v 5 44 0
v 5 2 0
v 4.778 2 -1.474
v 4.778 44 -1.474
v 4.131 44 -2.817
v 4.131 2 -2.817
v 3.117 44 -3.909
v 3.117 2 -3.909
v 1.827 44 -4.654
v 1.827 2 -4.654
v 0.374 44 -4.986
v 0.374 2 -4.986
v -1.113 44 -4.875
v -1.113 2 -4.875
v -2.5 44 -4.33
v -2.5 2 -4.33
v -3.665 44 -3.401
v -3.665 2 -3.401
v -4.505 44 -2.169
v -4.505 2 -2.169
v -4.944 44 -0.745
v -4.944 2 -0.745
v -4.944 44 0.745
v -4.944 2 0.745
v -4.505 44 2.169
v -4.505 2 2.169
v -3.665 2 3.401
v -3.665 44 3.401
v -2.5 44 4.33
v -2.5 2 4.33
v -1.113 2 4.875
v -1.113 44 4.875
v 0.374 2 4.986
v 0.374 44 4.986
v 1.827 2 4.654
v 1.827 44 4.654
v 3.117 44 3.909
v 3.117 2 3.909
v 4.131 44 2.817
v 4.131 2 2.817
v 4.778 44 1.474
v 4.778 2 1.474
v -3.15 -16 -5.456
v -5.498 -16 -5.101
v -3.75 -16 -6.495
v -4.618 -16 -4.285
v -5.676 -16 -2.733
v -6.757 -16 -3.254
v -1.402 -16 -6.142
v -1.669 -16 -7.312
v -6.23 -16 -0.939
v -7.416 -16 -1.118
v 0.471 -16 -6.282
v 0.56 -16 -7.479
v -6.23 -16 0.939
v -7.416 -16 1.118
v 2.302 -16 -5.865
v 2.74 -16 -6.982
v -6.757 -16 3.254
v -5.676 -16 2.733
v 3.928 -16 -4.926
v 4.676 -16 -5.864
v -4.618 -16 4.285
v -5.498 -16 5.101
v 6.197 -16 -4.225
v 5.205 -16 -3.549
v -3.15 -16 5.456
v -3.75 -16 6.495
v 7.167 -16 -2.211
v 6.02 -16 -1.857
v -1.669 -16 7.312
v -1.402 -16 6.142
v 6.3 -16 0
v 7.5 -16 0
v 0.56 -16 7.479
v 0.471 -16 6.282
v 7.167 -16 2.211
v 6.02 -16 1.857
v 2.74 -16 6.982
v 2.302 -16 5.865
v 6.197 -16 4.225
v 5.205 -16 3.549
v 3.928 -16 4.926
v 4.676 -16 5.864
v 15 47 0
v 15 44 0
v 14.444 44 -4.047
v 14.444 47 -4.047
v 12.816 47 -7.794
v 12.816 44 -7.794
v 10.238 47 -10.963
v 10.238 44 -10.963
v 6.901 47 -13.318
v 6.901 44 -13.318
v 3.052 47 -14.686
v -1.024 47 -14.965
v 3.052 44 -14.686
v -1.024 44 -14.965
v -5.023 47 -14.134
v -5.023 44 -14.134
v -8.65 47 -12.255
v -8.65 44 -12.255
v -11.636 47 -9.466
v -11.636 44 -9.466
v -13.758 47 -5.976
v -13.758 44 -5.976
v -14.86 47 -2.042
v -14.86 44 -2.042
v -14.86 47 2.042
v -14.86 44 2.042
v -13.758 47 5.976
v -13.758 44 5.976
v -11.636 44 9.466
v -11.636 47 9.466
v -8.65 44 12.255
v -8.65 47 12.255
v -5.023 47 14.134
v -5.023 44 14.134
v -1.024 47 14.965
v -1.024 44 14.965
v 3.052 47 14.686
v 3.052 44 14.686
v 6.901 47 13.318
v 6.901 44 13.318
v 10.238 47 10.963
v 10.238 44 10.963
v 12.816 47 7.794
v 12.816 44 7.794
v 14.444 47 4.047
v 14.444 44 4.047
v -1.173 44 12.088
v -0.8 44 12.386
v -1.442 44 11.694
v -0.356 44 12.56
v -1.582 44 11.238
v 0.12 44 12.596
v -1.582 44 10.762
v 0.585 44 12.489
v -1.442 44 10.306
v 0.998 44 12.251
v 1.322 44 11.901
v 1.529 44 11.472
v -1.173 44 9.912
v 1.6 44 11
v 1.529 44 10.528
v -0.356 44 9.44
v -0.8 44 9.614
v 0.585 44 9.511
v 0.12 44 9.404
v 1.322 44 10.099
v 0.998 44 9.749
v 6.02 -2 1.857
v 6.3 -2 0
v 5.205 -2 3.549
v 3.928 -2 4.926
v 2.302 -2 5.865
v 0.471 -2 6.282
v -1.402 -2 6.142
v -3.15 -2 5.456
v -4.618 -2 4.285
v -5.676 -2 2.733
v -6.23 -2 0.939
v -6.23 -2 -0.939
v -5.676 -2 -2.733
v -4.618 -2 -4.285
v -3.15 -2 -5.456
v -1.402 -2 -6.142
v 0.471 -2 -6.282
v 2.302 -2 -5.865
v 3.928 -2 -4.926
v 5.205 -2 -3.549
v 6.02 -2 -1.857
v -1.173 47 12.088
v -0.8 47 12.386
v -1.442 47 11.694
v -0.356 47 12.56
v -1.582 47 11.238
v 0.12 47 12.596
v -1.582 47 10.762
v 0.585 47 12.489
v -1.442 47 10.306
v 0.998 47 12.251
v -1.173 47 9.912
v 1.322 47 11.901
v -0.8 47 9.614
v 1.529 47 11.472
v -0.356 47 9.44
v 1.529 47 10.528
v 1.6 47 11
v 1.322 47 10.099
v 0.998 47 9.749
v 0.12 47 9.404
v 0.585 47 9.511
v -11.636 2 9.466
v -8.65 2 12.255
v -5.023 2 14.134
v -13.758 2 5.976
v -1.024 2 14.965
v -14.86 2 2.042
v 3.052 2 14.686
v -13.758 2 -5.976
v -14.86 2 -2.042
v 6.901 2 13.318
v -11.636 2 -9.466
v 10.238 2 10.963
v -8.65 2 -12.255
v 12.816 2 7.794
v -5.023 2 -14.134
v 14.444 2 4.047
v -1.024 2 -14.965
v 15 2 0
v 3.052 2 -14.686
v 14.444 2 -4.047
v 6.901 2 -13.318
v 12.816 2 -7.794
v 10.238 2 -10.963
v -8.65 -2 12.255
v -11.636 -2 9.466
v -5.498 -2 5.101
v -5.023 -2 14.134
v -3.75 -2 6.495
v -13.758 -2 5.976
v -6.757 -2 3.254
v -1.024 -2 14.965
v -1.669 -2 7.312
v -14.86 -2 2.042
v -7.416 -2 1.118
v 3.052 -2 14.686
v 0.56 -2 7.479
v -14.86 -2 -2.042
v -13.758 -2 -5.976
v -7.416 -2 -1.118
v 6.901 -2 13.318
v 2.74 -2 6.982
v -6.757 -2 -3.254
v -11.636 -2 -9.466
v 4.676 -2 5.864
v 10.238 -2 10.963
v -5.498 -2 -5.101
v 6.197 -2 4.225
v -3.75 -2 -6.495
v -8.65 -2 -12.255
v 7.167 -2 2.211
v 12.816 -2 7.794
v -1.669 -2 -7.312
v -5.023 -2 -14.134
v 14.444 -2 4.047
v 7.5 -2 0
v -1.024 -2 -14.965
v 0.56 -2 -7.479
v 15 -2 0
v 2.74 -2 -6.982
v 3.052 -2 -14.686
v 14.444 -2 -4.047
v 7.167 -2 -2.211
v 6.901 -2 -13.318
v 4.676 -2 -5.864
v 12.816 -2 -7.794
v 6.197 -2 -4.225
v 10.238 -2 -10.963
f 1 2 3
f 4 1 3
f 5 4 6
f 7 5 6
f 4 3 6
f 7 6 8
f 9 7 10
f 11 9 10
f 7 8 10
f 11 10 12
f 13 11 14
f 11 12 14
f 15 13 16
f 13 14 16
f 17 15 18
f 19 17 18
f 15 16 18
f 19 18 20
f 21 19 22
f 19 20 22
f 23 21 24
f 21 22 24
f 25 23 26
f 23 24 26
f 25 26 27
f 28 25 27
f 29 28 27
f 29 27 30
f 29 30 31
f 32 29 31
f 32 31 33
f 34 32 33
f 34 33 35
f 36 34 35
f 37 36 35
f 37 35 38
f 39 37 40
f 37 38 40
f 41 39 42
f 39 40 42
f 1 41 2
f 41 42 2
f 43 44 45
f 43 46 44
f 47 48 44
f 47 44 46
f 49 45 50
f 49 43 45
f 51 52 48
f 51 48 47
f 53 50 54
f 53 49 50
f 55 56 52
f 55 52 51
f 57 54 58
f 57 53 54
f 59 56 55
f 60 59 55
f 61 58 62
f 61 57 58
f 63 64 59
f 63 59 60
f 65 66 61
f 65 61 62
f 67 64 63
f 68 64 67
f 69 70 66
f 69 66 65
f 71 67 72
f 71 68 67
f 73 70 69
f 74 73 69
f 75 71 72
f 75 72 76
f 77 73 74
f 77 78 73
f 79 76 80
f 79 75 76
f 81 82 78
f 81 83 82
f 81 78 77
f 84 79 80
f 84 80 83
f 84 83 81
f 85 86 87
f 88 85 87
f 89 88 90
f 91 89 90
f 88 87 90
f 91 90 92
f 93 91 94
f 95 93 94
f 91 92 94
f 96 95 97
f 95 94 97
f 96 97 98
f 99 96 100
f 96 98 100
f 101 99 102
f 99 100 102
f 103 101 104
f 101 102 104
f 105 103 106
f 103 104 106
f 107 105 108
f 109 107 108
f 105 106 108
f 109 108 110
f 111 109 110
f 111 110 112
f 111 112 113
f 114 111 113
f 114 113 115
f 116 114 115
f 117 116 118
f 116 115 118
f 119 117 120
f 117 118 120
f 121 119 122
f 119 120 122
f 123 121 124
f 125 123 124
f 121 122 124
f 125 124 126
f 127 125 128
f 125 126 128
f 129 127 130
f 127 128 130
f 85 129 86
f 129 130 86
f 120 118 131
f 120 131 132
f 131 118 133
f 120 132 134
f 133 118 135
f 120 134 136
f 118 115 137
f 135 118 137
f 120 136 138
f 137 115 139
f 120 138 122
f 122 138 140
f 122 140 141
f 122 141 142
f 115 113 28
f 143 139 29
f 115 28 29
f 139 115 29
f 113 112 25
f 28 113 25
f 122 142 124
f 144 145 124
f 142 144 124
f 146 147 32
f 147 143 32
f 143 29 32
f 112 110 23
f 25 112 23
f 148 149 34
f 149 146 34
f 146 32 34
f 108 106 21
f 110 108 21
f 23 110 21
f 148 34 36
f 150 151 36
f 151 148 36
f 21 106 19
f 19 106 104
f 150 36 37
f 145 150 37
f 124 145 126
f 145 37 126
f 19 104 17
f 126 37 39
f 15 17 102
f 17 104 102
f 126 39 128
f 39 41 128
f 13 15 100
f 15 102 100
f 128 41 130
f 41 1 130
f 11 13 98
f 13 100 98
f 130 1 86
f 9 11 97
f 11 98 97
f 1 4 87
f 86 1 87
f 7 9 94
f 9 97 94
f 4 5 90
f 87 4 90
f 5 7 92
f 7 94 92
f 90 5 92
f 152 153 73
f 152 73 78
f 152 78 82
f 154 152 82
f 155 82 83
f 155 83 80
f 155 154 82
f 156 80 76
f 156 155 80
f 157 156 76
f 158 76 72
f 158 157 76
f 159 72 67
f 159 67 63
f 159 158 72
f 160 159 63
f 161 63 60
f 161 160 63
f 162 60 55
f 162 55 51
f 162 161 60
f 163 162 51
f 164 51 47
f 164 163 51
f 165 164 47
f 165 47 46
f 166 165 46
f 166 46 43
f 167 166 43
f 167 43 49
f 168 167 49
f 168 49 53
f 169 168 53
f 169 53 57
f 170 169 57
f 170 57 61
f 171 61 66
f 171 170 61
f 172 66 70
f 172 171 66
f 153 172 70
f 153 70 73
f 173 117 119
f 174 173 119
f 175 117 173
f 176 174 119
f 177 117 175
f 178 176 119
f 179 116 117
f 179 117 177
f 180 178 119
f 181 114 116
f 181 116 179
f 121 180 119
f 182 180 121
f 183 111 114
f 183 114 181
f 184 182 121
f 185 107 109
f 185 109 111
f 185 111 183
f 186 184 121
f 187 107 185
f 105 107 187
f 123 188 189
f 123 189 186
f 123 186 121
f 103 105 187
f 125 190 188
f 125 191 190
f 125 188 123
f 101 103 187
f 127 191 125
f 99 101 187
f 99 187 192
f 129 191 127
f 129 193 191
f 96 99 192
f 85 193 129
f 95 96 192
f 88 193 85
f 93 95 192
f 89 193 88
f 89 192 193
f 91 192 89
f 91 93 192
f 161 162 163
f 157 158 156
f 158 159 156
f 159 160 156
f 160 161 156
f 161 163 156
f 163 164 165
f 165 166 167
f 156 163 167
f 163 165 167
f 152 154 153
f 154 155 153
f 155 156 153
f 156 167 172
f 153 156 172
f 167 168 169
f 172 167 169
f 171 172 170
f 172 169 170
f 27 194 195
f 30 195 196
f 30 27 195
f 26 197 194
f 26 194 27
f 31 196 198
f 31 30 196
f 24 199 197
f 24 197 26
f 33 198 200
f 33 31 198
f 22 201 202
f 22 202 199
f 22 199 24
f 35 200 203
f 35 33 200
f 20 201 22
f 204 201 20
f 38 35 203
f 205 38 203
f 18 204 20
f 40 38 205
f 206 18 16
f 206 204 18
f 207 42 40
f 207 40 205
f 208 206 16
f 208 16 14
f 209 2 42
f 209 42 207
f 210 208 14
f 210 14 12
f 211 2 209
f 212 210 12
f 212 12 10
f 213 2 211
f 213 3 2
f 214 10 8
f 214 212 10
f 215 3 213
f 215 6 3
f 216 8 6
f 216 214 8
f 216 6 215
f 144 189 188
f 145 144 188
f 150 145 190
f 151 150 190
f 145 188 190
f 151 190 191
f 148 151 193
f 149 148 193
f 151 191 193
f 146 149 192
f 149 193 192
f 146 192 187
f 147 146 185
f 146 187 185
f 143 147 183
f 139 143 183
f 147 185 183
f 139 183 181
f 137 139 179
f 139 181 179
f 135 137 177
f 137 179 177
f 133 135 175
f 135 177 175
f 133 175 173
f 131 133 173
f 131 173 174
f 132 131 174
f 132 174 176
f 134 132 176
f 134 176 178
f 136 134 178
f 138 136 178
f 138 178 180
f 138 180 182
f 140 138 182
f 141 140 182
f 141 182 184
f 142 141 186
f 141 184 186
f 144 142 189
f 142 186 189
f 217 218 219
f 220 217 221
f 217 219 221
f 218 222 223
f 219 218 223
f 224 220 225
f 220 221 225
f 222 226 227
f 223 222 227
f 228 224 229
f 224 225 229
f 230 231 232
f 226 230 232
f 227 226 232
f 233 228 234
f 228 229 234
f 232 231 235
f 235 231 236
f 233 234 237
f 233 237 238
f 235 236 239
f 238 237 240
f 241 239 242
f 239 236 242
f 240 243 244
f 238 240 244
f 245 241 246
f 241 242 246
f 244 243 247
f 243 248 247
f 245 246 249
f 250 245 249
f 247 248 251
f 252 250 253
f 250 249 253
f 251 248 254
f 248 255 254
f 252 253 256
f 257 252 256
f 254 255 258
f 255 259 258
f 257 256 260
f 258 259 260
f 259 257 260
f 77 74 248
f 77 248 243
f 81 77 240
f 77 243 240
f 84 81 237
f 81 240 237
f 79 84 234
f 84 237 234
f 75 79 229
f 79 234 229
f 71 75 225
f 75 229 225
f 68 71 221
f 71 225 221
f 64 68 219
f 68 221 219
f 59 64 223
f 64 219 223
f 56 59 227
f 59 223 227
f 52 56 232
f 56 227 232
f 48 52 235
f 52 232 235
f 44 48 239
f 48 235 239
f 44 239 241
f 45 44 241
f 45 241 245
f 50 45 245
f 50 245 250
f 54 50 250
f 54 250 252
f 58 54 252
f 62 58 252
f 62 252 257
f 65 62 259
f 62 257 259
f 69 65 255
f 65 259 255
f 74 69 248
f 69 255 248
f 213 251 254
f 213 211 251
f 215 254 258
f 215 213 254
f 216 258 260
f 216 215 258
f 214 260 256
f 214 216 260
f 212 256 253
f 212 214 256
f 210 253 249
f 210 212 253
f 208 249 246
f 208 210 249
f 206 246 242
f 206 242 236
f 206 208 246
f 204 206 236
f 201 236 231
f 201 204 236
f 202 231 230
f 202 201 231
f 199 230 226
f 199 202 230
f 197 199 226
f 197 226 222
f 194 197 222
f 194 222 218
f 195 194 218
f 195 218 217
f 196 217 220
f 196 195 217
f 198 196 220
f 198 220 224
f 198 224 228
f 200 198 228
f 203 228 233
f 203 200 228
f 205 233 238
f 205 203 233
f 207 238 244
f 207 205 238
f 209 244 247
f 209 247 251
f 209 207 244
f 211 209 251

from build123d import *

# Parameters (mm, degrees)
SKETCH1_R           = 15
BOSS_EXTRUDE1_DEPTH = 2
SKETCH2_R           = 7.5
SKETCH2_R_2         = 6.3
BOSS_EXTRUDE2_DEPTH = 14
SKETCH4_R           = 5
BOSS_EXTRUDE3_DEPTH = 42
SKETCH5_R           = 15
BOSS_EXTRUDE4_DEPTH = 3
SKETCH6_R           = 1.6
CUT_EXTRUDE1_DEPTH  = 3


with BuildPart() as part:
    # Sketch1 → Boss-Extrude1 (new body, symmetric)
    with BuildSketch(Plane(origin=(0, 0, 0), x_dir=(1, 0, 0), z_dir=(0, 1, 0))):
        Circle(SKETCH1_R)
    extrude(amount=BOSS_EXTRUDE1_DEPTH, both=True)

    # Sketch2 → Boss-Extrude2 (add)
    with BuildSketch(Plane.XZ.offset(2)):
        Circle(SKETCH2_R)
        Circle(SKETCH2_R_2, mode=Mode.SUBTRACT)
    extrude(amount=BOSS_EXTRUDE2_DEPTH)

    # Sketch4 → Boss-Extrude3 (add)
    with BuildSketch(Plane(origin=(0, 2, 0), x_dir=(1, 0, 0), z_dir=(0, 1, 0))):
        Circle(SKETCH4_R)
    extrude(amount=BOSS_EXTRUDE3_DEPTH)

    # Sketch5 → Boss-Extrude4 (add)
    with BuildSketch(Plane(origin=(0, 44, 0), x_dir=(1, 0, 0), z_dir=(0, 1, 0))):
        Circle(SKETCH5_R)
    extrude(amount=BOSS_EXTRUDE4_DEPTH)

    # Sketch6 → Cut-Extrude1 (cut)
    with BuildSketch(Plane(origin=(0, 47, 0), x_dir=(1, 0, 0), z_dir=(0, 1, 0))):
        with Locations((0, -11)):
            Circle(SKETCH6_R)
    extrude(amount=-CUT_EXTRUDE1_DEPTH, mode=Mode.SUBTRACT)


solid = part.part
